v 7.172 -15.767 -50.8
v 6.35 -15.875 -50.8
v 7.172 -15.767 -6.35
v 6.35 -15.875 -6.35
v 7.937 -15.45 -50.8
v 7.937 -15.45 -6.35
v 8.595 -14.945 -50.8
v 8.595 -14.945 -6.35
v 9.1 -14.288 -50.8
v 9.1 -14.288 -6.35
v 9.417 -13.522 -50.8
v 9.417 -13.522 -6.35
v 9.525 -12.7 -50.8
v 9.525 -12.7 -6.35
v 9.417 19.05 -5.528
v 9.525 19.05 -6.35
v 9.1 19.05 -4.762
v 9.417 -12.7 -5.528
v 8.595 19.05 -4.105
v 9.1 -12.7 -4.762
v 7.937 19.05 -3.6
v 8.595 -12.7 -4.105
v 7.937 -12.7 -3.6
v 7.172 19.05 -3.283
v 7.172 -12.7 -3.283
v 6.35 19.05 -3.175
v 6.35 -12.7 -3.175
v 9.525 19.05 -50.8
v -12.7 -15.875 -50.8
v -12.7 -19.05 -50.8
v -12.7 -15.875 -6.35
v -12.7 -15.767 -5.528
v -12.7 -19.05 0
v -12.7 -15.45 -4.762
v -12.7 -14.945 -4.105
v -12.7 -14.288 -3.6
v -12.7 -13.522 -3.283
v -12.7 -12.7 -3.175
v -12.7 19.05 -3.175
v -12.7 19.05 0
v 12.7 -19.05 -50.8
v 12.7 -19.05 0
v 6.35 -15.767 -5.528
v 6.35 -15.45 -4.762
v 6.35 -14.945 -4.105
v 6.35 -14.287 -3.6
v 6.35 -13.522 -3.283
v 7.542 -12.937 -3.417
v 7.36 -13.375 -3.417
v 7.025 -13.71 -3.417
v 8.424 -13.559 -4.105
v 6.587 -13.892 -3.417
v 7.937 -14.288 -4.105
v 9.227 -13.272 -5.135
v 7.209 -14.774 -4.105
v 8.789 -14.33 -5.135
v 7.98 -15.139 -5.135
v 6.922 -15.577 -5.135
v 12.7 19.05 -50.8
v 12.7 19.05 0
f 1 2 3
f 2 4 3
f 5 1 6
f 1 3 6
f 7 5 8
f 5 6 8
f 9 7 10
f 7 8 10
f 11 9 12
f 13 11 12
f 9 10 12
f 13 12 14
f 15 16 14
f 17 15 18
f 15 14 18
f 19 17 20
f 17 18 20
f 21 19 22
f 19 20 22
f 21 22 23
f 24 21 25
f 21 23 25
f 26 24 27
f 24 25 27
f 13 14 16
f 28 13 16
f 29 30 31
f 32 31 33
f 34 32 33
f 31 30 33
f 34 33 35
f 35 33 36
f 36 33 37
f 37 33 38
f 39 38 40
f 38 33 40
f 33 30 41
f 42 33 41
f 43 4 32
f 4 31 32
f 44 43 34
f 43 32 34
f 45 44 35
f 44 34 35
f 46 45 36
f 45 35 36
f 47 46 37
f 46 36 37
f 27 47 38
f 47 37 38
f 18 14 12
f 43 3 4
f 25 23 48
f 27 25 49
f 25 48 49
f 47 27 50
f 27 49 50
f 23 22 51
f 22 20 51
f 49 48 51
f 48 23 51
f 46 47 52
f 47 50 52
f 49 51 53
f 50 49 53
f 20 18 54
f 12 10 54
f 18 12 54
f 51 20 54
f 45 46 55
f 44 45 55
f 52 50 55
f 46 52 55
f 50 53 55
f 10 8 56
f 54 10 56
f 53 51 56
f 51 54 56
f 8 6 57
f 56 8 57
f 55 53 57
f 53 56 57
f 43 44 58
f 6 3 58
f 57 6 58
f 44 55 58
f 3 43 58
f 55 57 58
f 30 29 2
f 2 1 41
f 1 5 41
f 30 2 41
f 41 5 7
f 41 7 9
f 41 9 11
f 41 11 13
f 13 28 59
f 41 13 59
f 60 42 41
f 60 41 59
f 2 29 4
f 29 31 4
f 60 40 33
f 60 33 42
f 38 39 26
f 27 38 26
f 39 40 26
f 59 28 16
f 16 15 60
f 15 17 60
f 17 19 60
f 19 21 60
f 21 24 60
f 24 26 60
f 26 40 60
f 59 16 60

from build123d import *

# Parameters (mm, degrees)
SKETCH1_W           = 25.4
SKETCH1_H           = 38.1
BOSS_EXTRUDE1_DEPTH = 50.8
SHELL1_T            = -3.175
FILLET1_R           = 3.175


with BuildPart() as part:
    # Sketch1 → Boss-Extrude1 (new body)
    with BuildSketch(Plane.XY):
        Rectangle(SKETCH1_W, SKETCH1_H)
    extrude(amount=-BOSS_EXTRUDE1_DEPTH)

    # Shell1
    shell1_openings = [part.faces().sort_by_distance(p)[0] for p in [
        (0, 0, -50.8),
        (-12.7, 0, -25.4),
        (0, 19.05, -25.4),
    ]]
    offset(amount=SHELL1_T, openings=shell1_openings, kind=Kind.INTERSECTION)

    # Fillet1
    fillet1_edges = [part.edges().sort_by_distance(p)[0] for p in [
        (9.525, -15.875, -26.9875),
        (9.525, 1.5875, -3.175),
        (-1.5875, -15.875, -3.175),
    ]]
    fillet(fillet1_edges, radius=FILLET1_R)


solid = part.part
